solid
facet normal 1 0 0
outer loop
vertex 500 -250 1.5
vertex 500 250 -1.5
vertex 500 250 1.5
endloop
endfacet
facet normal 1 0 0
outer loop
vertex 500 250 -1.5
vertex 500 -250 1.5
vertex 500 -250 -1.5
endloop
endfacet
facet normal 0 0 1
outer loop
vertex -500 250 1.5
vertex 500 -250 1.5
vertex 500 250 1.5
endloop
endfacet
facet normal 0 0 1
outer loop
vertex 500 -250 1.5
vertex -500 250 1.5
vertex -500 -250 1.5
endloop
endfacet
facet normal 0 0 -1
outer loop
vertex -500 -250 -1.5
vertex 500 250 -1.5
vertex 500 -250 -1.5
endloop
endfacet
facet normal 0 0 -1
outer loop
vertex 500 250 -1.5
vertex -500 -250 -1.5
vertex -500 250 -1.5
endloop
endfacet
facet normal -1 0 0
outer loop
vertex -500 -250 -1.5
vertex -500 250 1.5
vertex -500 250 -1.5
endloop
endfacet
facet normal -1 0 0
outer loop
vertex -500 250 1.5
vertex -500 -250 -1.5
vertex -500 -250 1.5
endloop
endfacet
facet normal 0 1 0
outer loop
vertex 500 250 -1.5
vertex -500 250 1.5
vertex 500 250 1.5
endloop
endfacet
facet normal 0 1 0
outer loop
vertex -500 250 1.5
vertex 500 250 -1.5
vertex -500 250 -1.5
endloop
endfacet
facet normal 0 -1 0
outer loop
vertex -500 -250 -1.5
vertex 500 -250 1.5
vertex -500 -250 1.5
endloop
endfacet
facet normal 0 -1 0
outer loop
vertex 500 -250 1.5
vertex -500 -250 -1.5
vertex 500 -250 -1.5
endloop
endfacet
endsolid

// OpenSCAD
// Parameters
sheet_length = 1000; //[500:2000:1]
sheet_width = 500; //[250:1000:1]
sheet_thickness = 3; //[1.5:6:0.1]
film_thickness = 0.05; //[0.02:0.2:0.01]
film_inset = 0.5; //[0.1:2:0.1]
overlap = 1; //[0.5:2:0.1]
corner_radius = 0; //[0:25:0.5]
edge_chamfer = 0; //[0:5:0.25]

// Base Shapes
module sheet_panel() {
  color("Silver")
  cube([sheet_length, sheet_width, sheet_thickness], center=true);
}

module protective_film_layer() {
  color([0.85, 0.85, 0.8]) // Off-white for protective film
  translate([0, 0, sheet_thickness/2 + film_thickness/2 - overlap])
  cube([sheet_length - 2*film_inset, sheet_width - 2*film_inset, film_thickness], center=true);
}

module edge_chamfer() {
  // Placeholder for edge chamfer, kept at 0 for sharp edges
}

module corner_radius() {
  // Placeholder for corner radius, kept at 0 for sharp corners
}

module label_text() {
  // Placeholder for label text, represented as a small box
  translate([0, 0, sheet_thickness/2 + film_thickness/2 - overlap])
  cube([sheet_length/10, sheet_width/10, film_thickness], center=true);
}

// Operations
module panel_with_film() {
  union() {
    sheet_panel();
    protective_film_layer();
  }
}

module complete_model() {
  union() {
    panel_with_film();
    edge_chamfer();
    corner_radius();
    label_text();
  }
}

// Final Output
complete_model();
